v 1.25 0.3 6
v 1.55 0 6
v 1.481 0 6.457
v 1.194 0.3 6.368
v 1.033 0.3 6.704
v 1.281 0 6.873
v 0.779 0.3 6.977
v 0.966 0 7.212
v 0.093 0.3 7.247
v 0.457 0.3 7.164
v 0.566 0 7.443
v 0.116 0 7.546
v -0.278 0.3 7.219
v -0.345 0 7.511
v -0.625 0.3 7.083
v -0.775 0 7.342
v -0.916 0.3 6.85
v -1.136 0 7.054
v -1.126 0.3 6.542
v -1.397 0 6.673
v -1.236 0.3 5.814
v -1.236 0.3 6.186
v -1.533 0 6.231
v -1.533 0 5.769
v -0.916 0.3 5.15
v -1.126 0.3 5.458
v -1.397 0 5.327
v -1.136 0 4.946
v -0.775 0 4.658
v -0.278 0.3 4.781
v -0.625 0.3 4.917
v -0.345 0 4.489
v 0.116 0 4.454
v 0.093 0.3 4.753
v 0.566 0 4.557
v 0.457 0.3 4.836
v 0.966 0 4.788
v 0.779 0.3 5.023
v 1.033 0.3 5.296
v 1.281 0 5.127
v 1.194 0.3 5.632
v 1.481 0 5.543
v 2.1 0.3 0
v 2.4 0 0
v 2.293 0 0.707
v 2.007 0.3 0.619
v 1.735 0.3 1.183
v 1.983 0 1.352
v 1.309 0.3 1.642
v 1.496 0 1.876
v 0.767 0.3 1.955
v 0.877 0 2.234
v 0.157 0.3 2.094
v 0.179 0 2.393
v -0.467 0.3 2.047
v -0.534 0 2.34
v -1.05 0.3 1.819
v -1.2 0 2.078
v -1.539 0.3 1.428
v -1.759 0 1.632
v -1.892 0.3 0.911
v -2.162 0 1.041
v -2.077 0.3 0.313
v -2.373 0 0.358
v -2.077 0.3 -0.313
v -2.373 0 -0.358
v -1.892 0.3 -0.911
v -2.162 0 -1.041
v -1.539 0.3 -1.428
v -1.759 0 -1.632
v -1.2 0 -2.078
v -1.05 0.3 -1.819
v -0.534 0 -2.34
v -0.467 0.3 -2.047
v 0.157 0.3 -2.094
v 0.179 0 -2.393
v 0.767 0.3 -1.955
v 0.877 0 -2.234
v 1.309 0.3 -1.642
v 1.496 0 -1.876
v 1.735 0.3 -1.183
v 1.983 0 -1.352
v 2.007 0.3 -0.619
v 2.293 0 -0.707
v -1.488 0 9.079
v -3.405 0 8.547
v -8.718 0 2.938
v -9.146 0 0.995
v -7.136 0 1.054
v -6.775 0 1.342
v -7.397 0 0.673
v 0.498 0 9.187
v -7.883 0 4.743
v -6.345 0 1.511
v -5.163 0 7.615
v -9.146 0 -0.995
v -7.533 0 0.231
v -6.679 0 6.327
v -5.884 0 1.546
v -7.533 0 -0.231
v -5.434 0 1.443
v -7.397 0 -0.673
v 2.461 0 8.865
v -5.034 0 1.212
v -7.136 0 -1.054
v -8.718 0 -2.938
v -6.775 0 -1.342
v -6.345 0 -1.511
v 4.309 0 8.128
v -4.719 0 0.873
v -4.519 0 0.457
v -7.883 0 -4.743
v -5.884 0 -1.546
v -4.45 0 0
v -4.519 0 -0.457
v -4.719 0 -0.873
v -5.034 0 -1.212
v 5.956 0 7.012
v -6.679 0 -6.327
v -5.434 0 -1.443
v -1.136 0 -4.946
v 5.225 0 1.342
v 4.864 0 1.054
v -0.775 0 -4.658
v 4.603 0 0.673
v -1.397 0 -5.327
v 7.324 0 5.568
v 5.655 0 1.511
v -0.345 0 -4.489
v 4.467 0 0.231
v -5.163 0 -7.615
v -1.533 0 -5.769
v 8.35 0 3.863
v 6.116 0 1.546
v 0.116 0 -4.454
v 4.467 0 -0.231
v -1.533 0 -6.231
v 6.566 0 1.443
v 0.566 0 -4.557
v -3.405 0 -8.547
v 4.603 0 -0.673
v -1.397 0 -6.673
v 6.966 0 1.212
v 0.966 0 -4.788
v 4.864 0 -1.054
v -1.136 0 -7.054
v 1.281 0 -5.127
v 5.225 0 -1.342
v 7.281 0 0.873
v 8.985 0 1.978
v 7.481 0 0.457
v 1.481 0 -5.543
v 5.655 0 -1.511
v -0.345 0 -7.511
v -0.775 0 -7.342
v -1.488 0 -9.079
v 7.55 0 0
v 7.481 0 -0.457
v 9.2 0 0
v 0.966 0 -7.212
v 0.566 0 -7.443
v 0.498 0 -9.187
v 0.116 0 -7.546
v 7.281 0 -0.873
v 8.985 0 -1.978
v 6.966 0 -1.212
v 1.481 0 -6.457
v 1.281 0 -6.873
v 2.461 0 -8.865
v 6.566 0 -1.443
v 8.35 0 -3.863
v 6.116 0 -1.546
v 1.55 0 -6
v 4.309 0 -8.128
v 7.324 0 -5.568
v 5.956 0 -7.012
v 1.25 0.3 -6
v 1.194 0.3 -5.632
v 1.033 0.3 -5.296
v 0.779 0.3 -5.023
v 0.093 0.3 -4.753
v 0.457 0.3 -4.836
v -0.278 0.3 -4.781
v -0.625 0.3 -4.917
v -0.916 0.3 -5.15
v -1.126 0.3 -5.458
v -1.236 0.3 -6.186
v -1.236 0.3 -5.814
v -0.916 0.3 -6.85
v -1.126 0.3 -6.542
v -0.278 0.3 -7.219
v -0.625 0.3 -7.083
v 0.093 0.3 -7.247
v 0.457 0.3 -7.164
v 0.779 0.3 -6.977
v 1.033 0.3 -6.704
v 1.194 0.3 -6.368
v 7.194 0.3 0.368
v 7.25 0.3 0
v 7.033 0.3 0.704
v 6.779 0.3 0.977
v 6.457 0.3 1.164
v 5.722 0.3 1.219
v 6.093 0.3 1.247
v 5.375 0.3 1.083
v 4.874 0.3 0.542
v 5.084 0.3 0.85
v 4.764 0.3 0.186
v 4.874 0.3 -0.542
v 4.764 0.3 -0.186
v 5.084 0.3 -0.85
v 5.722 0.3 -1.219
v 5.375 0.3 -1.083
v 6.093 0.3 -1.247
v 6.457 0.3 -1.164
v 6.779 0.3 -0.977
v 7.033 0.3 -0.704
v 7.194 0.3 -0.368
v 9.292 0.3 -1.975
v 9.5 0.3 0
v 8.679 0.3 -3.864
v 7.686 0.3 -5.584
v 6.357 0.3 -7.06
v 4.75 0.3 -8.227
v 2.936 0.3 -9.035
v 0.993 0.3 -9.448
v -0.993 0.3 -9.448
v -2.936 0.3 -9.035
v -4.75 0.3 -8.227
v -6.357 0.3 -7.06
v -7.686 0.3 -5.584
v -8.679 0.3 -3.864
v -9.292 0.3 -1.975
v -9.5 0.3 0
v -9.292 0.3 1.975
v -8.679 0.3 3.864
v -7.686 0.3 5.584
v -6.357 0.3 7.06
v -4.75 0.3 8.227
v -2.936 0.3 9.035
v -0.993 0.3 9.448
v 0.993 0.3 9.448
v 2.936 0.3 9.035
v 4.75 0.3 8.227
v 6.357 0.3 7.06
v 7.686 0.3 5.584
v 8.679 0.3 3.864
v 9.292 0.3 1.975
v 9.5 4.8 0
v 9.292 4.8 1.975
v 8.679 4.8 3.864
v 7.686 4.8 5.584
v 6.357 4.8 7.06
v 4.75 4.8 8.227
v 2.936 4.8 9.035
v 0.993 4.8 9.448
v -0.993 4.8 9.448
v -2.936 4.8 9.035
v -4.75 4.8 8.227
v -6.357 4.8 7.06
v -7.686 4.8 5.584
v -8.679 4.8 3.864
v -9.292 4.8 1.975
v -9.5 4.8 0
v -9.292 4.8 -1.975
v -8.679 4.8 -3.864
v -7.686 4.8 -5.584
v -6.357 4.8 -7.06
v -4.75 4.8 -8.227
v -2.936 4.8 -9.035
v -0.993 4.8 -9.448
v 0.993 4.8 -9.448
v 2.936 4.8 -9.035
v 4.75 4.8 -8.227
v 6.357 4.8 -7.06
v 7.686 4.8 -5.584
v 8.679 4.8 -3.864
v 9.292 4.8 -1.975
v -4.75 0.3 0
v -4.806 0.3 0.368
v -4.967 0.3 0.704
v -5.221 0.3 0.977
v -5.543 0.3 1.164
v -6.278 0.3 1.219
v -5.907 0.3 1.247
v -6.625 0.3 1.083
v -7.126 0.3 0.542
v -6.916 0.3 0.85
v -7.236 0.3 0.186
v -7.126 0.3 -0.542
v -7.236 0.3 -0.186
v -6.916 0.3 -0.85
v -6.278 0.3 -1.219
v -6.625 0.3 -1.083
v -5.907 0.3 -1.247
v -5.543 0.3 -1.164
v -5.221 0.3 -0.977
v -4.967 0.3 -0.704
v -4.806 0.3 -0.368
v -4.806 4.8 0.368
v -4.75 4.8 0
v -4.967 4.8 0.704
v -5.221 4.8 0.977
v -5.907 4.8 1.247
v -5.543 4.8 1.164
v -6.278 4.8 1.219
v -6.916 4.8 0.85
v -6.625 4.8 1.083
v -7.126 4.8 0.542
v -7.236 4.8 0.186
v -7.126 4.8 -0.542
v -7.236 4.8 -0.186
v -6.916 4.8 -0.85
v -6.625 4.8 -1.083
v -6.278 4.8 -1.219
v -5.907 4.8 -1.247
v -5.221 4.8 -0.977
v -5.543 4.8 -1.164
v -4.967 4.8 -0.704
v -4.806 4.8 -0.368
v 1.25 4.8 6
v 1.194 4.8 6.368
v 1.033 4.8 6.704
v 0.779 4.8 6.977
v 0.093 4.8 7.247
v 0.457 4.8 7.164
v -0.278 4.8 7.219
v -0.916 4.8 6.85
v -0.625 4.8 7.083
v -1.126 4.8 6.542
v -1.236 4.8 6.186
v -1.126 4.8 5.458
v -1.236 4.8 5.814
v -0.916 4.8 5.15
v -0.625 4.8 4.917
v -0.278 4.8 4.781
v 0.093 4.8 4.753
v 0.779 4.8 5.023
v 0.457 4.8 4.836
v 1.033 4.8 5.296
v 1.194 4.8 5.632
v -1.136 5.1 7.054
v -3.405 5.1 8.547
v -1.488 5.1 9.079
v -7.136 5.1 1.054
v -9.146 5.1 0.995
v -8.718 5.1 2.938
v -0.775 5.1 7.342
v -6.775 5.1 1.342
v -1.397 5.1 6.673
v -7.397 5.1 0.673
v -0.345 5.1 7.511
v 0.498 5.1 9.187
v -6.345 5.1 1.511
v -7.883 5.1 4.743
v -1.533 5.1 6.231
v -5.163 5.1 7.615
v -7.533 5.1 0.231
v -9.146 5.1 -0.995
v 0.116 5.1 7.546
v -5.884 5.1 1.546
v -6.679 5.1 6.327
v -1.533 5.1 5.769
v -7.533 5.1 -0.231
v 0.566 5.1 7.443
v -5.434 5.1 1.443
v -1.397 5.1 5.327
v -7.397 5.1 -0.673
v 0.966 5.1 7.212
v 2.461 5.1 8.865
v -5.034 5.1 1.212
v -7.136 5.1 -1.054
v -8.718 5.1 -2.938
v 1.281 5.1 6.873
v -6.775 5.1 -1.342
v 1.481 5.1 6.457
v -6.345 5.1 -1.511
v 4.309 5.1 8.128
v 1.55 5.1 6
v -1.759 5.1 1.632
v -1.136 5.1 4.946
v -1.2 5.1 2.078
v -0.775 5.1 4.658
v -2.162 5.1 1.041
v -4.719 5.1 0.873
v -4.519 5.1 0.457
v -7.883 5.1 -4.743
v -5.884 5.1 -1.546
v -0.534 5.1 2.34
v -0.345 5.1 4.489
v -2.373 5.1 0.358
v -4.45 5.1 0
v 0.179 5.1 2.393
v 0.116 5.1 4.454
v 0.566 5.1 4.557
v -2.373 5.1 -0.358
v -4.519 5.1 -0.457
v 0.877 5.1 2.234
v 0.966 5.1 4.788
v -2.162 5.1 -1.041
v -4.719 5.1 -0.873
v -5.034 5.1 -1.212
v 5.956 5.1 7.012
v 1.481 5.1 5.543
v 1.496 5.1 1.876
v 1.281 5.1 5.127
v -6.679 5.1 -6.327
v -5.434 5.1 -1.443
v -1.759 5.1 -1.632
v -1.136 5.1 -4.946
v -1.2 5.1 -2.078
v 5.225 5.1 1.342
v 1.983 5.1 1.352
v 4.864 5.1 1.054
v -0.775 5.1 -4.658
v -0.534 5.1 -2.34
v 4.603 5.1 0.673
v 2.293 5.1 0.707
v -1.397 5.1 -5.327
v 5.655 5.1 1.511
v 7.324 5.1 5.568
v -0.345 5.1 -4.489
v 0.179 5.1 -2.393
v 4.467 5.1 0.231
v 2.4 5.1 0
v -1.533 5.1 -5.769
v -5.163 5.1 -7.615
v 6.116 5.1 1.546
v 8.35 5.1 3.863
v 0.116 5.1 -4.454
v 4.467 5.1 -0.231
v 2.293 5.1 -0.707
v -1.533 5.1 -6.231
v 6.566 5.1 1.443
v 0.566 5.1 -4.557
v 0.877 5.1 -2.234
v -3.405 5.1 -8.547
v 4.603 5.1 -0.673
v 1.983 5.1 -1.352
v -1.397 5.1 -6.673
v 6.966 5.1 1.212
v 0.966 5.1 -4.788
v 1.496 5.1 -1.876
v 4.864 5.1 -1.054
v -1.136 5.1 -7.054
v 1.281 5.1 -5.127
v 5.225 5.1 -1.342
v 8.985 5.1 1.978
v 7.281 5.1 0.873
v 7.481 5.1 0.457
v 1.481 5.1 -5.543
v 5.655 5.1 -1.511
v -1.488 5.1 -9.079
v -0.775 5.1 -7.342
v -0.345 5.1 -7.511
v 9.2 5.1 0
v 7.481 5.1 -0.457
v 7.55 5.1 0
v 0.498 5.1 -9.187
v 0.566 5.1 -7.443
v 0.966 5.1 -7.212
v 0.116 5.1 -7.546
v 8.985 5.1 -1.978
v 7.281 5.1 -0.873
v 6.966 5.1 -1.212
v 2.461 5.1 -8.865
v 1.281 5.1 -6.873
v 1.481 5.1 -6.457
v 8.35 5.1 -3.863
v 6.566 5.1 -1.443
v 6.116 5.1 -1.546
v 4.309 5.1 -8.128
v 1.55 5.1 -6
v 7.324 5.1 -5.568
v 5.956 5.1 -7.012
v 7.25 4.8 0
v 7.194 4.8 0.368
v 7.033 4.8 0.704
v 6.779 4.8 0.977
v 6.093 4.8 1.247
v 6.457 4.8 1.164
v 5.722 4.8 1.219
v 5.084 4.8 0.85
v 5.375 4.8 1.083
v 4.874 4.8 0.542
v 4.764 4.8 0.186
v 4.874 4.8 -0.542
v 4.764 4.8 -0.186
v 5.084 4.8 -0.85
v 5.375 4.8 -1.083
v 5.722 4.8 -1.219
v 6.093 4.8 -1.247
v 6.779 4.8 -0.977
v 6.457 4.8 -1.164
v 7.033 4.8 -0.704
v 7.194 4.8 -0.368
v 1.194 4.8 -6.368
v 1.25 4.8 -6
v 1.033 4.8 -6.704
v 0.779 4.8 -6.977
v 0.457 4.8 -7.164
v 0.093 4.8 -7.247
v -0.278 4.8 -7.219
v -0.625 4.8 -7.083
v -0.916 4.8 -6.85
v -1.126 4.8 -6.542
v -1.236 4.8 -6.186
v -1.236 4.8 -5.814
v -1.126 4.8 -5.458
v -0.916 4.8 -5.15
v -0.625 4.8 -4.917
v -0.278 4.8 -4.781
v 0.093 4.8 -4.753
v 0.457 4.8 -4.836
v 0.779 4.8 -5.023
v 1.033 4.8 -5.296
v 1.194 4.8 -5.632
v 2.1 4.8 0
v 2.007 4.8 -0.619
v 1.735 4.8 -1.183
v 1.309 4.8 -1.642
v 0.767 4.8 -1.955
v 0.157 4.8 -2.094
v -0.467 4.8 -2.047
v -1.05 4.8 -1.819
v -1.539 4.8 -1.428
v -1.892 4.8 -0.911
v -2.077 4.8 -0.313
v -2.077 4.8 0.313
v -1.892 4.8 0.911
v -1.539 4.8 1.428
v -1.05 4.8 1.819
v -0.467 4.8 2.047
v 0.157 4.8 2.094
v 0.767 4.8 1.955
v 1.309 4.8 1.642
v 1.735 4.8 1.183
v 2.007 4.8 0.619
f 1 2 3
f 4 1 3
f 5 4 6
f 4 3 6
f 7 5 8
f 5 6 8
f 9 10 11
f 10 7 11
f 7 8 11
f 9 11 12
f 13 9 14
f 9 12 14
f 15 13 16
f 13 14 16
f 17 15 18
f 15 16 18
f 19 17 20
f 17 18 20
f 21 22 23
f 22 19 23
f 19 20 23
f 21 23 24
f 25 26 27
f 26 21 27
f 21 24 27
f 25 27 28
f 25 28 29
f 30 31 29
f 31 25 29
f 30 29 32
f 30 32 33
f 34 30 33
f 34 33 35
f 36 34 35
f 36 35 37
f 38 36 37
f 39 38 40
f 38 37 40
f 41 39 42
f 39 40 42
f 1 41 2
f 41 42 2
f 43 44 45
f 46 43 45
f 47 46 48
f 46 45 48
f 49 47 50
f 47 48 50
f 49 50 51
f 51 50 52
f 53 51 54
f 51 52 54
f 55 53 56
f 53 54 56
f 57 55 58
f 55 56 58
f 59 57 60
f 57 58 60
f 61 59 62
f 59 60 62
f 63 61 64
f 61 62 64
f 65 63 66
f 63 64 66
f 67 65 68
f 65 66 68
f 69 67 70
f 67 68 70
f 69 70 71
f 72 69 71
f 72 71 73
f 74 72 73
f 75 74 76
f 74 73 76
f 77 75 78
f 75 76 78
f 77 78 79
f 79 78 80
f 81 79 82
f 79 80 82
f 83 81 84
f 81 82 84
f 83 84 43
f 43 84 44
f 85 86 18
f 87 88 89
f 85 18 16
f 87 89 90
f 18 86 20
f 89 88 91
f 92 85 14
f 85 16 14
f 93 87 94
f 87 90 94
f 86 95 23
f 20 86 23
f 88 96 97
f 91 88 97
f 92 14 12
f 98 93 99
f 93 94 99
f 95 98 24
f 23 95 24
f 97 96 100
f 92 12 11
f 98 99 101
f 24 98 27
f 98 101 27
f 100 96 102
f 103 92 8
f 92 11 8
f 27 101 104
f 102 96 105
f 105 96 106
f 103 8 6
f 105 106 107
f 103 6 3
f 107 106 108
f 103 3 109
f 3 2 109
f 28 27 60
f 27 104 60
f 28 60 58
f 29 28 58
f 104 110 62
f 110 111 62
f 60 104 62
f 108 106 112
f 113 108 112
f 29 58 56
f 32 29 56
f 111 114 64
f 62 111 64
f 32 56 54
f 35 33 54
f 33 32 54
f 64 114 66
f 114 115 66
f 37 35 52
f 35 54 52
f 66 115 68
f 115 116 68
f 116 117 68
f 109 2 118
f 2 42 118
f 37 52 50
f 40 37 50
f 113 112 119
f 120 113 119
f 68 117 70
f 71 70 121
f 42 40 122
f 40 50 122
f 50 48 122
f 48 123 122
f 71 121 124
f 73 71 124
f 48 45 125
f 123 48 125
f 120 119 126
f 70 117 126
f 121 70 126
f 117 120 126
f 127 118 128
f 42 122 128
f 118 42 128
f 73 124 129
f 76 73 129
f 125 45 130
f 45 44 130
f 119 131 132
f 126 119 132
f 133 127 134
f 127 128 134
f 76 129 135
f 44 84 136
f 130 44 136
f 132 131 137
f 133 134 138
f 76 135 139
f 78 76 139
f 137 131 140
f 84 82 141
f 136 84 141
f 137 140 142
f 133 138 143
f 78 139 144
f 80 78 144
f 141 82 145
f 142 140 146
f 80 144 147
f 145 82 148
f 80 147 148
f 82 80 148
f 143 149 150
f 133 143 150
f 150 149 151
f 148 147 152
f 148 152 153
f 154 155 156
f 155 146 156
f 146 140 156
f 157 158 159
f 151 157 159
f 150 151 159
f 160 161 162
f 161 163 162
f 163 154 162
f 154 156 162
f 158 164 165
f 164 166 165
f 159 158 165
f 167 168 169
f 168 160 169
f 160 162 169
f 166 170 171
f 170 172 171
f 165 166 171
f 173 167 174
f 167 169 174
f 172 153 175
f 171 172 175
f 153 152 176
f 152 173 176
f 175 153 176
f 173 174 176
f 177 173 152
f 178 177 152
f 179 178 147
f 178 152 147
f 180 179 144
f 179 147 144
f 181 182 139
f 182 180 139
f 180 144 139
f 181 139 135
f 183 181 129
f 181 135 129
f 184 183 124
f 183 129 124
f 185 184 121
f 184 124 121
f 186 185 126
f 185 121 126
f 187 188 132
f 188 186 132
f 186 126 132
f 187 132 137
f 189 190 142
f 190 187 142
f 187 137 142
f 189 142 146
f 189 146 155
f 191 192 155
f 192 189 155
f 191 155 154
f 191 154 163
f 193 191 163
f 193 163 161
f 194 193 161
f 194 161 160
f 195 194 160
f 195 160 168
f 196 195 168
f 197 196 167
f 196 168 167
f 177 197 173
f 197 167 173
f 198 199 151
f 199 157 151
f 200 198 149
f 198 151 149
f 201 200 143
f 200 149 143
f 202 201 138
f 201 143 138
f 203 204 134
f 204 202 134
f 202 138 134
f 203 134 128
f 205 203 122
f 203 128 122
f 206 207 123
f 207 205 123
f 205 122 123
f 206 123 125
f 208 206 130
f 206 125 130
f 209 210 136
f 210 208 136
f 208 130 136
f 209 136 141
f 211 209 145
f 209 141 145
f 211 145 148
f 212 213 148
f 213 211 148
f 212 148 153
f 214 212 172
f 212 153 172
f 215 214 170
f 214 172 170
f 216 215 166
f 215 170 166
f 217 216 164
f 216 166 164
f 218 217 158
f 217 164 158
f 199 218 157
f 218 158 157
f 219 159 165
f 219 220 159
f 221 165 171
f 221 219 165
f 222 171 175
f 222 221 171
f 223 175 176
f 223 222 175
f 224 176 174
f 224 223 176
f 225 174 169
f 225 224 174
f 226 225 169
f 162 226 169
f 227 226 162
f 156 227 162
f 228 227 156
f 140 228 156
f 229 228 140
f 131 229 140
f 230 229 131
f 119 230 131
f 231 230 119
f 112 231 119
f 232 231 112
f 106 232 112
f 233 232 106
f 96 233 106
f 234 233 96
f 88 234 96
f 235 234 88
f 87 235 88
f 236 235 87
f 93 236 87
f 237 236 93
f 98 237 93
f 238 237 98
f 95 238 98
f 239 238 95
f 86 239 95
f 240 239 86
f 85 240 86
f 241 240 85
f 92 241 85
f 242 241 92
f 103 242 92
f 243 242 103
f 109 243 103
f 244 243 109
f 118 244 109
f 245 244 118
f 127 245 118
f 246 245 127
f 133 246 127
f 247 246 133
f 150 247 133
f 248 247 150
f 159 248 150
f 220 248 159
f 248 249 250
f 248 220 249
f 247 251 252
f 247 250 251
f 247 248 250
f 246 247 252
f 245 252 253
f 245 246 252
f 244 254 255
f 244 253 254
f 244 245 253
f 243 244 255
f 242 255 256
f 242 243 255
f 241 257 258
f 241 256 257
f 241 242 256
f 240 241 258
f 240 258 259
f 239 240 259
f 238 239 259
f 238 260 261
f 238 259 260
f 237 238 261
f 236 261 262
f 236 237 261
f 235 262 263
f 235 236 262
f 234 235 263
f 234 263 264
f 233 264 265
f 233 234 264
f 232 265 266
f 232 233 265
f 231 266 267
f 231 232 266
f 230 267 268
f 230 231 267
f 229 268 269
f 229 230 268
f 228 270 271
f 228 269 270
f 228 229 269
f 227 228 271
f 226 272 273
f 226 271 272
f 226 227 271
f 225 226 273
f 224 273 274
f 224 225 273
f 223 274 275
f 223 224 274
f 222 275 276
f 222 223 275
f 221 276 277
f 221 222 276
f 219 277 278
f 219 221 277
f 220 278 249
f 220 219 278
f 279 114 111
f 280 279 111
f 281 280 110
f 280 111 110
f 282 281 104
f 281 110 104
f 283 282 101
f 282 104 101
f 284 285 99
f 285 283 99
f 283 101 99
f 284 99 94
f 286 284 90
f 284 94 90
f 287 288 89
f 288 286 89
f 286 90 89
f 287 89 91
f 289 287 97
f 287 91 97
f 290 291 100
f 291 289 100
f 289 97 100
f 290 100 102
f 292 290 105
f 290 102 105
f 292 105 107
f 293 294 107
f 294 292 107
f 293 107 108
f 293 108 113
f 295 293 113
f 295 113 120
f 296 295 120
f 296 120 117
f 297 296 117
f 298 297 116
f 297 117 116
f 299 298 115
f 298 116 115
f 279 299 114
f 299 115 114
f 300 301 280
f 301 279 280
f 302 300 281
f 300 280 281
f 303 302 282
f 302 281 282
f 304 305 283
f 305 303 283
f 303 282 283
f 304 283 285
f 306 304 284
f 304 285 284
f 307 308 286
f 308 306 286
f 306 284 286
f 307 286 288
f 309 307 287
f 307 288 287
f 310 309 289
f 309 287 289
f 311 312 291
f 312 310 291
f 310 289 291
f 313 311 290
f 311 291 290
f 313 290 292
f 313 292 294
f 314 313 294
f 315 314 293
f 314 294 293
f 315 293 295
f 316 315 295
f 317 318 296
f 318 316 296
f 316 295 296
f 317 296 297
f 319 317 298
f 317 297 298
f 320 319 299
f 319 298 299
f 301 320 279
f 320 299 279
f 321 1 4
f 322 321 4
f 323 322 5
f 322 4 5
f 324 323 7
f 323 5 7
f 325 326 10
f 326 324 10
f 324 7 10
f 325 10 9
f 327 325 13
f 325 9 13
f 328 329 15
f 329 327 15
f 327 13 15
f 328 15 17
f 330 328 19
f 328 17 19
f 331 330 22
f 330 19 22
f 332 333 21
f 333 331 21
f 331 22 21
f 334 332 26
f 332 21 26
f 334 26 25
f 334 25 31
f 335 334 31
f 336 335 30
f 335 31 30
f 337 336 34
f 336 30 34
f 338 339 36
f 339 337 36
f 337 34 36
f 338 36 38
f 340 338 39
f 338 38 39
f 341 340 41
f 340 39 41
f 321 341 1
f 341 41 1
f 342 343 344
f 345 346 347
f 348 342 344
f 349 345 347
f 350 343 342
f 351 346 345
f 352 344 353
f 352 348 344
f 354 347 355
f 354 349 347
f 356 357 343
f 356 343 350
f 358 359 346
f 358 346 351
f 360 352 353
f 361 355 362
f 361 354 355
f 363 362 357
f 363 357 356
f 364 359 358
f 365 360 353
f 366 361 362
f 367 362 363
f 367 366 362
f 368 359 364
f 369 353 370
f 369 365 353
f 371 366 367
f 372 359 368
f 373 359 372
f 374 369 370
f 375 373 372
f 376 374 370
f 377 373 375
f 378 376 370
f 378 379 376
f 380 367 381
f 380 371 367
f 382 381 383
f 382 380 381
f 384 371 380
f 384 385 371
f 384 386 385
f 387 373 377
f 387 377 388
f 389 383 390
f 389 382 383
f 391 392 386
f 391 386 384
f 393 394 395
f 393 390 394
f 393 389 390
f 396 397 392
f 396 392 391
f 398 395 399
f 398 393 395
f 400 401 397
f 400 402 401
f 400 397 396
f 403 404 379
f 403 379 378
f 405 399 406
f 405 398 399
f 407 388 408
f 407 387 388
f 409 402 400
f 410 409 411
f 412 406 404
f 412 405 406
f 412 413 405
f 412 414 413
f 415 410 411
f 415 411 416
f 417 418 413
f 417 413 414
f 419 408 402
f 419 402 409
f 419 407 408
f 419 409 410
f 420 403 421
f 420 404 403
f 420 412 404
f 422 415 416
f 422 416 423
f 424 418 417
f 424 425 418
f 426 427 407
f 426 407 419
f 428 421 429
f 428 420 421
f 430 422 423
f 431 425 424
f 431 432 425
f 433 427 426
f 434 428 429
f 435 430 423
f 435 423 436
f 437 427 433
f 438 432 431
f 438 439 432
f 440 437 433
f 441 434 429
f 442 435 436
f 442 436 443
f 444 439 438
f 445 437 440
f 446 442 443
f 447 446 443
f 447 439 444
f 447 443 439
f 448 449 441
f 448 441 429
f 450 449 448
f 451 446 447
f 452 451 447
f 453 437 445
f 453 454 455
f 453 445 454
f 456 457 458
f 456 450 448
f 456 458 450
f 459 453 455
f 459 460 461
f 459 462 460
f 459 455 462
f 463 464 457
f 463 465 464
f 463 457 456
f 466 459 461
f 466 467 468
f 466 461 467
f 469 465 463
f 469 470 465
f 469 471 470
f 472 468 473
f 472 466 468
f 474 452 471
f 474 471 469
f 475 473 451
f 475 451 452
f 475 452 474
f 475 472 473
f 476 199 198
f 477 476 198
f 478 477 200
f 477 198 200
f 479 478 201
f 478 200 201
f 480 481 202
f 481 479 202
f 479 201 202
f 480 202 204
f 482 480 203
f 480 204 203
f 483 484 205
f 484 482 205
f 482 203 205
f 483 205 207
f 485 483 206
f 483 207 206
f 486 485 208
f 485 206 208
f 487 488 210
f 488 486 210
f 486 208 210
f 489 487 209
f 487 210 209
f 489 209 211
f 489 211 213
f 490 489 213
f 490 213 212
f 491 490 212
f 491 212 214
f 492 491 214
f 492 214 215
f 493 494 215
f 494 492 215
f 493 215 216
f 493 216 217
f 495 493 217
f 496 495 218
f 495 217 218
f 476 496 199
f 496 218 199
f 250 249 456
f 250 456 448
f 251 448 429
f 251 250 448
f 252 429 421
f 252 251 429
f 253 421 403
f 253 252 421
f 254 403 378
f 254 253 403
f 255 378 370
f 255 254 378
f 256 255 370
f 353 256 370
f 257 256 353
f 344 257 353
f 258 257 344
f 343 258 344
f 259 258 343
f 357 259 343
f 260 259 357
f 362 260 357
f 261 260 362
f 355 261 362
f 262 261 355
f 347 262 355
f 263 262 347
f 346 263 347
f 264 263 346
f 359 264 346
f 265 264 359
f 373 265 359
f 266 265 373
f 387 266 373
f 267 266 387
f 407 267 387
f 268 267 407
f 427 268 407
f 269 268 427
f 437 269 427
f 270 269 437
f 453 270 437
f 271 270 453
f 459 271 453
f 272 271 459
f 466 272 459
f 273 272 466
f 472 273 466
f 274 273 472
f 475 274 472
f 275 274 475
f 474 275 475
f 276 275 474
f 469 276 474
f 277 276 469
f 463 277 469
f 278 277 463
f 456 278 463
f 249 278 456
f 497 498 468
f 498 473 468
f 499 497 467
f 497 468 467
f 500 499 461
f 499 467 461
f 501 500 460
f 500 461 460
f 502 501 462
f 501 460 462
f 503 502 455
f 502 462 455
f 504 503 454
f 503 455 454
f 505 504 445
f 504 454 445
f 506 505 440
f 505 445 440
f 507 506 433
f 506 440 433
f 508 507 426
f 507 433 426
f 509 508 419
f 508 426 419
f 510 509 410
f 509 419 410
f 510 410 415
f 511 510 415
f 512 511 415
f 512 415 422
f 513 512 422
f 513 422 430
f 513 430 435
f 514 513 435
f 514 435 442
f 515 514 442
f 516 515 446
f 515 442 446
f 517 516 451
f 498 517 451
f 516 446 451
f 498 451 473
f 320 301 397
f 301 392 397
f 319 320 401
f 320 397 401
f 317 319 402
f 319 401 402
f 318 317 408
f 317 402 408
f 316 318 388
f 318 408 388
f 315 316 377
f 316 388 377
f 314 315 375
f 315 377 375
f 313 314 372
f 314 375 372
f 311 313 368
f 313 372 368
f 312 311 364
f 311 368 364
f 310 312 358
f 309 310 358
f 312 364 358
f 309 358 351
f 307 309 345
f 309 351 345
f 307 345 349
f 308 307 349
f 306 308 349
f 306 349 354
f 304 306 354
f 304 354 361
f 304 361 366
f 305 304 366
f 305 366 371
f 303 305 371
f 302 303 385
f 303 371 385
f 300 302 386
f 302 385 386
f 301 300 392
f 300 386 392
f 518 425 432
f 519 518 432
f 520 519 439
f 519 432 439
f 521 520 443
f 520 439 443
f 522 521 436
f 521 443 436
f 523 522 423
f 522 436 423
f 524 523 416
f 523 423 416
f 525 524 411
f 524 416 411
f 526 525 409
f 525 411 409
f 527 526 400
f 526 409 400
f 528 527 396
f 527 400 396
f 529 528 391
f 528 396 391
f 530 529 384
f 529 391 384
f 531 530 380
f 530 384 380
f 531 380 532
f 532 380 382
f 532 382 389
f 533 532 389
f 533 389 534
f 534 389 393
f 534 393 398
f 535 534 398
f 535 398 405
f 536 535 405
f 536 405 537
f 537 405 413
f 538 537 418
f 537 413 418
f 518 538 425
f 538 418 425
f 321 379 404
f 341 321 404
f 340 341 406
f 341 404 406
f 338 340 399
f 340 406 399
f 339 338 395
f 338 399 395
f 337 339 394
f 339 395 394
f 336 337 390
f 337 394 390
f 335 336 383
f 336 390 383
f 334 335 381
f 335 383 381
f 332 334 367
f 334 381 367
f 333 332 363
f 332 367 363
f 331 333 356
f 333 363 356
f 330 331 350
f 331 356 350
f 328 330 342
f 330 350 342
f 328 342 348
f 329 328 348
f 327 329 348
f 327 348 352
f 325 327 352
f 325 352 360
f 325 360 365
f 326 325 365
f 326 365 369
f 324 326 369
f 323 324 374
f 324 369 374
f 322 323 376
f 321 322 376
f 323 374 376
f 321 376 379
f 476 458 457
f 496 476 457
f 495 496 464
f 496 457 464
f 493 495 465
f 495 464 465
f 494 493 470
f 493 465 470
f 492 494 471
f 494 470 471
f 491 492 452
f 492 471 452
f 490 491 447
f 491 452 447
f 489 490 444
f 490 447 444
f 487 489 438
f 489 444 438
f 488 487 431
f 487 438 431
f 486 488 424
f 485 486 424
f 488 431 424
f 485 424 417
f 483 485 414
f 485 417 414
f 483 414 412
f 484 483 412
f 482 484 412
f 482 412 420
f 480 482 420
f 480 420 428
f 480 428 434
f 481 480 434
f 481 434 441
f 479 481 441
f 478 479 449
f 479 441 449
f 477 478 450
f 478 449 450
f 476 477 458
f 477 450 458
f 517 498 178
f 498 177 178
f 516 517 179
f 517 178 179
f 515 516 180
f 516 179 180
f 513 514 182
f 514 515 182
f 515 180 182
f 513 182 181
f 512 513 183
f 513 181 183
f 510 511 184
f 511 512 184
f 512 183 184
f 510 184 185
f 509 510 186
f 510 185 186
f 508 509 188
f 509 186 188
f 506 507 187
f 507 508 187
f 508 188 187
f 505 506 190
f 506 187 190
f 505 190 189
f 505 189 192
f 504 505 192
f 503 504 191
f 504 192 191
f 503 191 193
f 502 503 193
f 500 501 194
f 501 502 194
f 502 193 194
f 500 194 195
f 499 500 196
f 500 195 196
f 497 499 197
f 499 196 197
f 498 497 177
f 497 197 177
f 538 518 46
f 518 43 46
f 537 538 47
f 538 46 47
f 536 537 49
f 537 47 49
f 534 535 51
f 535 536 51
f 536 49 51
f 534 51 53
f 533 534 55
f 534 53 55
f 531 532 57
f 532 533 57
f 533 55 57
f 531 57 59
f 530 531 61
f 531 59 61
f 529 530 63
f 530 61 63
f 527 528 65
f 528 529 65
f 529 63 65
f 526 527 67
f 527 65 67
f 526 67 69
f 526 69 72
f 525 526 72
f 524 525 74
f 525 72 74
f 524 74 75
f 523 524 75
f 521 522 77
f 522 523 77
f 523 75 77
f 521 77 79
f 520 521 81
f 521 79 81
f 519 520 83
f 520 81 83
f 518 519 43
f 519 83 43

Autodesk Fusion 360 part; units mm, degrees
sketch "Sketch1" plane through (0, 0, 0) normal (0, 1, 0) x (1, 0, 0)
  circle A0 centre (0, 0) radius 9.5
  circle A1 centre (0, 0) radius 2.1
  circle A2 centre (6, 0) radius 1.25
  circle A3 centre (0, 0) radius 6 construction
  circle A4 centre (0, 6) radius 1.25
  circle A5 centre (-6, 0) radius 1.25
  circle A6 centre (0, -6) radius 1.25
  dimension "d1" = 19
  dimension "d2" = 4.2
  dimension "d3" = 2.5
  dimension "d5" = 360
extrude "Extrude1" add sketch "Sketch1" along normal blind 5.1
chamfer "Chamfer1" distance 0.3 angle 45 2 edges at (-8.8571, 5.1, 3.4353) (-8.8571, 0, 3.4353)
chamfer "Chamfer2" distance 0.3 angle 45 10 edges at (-1.9579, 5.1, -0.7594) (-1.1654, 5.1, -6.452) (-7.1654, 5.1, -0.452) (-1.1654, 5.1, 5.548) (4.8346, 5.1, -0.452) (-1.1654, 0, 5.548) (-7.1654, 0, -0.452) (-1.1654, 0, -6.452) (-1.9579, 0, -0.7594) (4.8346, 0, -0.452)
